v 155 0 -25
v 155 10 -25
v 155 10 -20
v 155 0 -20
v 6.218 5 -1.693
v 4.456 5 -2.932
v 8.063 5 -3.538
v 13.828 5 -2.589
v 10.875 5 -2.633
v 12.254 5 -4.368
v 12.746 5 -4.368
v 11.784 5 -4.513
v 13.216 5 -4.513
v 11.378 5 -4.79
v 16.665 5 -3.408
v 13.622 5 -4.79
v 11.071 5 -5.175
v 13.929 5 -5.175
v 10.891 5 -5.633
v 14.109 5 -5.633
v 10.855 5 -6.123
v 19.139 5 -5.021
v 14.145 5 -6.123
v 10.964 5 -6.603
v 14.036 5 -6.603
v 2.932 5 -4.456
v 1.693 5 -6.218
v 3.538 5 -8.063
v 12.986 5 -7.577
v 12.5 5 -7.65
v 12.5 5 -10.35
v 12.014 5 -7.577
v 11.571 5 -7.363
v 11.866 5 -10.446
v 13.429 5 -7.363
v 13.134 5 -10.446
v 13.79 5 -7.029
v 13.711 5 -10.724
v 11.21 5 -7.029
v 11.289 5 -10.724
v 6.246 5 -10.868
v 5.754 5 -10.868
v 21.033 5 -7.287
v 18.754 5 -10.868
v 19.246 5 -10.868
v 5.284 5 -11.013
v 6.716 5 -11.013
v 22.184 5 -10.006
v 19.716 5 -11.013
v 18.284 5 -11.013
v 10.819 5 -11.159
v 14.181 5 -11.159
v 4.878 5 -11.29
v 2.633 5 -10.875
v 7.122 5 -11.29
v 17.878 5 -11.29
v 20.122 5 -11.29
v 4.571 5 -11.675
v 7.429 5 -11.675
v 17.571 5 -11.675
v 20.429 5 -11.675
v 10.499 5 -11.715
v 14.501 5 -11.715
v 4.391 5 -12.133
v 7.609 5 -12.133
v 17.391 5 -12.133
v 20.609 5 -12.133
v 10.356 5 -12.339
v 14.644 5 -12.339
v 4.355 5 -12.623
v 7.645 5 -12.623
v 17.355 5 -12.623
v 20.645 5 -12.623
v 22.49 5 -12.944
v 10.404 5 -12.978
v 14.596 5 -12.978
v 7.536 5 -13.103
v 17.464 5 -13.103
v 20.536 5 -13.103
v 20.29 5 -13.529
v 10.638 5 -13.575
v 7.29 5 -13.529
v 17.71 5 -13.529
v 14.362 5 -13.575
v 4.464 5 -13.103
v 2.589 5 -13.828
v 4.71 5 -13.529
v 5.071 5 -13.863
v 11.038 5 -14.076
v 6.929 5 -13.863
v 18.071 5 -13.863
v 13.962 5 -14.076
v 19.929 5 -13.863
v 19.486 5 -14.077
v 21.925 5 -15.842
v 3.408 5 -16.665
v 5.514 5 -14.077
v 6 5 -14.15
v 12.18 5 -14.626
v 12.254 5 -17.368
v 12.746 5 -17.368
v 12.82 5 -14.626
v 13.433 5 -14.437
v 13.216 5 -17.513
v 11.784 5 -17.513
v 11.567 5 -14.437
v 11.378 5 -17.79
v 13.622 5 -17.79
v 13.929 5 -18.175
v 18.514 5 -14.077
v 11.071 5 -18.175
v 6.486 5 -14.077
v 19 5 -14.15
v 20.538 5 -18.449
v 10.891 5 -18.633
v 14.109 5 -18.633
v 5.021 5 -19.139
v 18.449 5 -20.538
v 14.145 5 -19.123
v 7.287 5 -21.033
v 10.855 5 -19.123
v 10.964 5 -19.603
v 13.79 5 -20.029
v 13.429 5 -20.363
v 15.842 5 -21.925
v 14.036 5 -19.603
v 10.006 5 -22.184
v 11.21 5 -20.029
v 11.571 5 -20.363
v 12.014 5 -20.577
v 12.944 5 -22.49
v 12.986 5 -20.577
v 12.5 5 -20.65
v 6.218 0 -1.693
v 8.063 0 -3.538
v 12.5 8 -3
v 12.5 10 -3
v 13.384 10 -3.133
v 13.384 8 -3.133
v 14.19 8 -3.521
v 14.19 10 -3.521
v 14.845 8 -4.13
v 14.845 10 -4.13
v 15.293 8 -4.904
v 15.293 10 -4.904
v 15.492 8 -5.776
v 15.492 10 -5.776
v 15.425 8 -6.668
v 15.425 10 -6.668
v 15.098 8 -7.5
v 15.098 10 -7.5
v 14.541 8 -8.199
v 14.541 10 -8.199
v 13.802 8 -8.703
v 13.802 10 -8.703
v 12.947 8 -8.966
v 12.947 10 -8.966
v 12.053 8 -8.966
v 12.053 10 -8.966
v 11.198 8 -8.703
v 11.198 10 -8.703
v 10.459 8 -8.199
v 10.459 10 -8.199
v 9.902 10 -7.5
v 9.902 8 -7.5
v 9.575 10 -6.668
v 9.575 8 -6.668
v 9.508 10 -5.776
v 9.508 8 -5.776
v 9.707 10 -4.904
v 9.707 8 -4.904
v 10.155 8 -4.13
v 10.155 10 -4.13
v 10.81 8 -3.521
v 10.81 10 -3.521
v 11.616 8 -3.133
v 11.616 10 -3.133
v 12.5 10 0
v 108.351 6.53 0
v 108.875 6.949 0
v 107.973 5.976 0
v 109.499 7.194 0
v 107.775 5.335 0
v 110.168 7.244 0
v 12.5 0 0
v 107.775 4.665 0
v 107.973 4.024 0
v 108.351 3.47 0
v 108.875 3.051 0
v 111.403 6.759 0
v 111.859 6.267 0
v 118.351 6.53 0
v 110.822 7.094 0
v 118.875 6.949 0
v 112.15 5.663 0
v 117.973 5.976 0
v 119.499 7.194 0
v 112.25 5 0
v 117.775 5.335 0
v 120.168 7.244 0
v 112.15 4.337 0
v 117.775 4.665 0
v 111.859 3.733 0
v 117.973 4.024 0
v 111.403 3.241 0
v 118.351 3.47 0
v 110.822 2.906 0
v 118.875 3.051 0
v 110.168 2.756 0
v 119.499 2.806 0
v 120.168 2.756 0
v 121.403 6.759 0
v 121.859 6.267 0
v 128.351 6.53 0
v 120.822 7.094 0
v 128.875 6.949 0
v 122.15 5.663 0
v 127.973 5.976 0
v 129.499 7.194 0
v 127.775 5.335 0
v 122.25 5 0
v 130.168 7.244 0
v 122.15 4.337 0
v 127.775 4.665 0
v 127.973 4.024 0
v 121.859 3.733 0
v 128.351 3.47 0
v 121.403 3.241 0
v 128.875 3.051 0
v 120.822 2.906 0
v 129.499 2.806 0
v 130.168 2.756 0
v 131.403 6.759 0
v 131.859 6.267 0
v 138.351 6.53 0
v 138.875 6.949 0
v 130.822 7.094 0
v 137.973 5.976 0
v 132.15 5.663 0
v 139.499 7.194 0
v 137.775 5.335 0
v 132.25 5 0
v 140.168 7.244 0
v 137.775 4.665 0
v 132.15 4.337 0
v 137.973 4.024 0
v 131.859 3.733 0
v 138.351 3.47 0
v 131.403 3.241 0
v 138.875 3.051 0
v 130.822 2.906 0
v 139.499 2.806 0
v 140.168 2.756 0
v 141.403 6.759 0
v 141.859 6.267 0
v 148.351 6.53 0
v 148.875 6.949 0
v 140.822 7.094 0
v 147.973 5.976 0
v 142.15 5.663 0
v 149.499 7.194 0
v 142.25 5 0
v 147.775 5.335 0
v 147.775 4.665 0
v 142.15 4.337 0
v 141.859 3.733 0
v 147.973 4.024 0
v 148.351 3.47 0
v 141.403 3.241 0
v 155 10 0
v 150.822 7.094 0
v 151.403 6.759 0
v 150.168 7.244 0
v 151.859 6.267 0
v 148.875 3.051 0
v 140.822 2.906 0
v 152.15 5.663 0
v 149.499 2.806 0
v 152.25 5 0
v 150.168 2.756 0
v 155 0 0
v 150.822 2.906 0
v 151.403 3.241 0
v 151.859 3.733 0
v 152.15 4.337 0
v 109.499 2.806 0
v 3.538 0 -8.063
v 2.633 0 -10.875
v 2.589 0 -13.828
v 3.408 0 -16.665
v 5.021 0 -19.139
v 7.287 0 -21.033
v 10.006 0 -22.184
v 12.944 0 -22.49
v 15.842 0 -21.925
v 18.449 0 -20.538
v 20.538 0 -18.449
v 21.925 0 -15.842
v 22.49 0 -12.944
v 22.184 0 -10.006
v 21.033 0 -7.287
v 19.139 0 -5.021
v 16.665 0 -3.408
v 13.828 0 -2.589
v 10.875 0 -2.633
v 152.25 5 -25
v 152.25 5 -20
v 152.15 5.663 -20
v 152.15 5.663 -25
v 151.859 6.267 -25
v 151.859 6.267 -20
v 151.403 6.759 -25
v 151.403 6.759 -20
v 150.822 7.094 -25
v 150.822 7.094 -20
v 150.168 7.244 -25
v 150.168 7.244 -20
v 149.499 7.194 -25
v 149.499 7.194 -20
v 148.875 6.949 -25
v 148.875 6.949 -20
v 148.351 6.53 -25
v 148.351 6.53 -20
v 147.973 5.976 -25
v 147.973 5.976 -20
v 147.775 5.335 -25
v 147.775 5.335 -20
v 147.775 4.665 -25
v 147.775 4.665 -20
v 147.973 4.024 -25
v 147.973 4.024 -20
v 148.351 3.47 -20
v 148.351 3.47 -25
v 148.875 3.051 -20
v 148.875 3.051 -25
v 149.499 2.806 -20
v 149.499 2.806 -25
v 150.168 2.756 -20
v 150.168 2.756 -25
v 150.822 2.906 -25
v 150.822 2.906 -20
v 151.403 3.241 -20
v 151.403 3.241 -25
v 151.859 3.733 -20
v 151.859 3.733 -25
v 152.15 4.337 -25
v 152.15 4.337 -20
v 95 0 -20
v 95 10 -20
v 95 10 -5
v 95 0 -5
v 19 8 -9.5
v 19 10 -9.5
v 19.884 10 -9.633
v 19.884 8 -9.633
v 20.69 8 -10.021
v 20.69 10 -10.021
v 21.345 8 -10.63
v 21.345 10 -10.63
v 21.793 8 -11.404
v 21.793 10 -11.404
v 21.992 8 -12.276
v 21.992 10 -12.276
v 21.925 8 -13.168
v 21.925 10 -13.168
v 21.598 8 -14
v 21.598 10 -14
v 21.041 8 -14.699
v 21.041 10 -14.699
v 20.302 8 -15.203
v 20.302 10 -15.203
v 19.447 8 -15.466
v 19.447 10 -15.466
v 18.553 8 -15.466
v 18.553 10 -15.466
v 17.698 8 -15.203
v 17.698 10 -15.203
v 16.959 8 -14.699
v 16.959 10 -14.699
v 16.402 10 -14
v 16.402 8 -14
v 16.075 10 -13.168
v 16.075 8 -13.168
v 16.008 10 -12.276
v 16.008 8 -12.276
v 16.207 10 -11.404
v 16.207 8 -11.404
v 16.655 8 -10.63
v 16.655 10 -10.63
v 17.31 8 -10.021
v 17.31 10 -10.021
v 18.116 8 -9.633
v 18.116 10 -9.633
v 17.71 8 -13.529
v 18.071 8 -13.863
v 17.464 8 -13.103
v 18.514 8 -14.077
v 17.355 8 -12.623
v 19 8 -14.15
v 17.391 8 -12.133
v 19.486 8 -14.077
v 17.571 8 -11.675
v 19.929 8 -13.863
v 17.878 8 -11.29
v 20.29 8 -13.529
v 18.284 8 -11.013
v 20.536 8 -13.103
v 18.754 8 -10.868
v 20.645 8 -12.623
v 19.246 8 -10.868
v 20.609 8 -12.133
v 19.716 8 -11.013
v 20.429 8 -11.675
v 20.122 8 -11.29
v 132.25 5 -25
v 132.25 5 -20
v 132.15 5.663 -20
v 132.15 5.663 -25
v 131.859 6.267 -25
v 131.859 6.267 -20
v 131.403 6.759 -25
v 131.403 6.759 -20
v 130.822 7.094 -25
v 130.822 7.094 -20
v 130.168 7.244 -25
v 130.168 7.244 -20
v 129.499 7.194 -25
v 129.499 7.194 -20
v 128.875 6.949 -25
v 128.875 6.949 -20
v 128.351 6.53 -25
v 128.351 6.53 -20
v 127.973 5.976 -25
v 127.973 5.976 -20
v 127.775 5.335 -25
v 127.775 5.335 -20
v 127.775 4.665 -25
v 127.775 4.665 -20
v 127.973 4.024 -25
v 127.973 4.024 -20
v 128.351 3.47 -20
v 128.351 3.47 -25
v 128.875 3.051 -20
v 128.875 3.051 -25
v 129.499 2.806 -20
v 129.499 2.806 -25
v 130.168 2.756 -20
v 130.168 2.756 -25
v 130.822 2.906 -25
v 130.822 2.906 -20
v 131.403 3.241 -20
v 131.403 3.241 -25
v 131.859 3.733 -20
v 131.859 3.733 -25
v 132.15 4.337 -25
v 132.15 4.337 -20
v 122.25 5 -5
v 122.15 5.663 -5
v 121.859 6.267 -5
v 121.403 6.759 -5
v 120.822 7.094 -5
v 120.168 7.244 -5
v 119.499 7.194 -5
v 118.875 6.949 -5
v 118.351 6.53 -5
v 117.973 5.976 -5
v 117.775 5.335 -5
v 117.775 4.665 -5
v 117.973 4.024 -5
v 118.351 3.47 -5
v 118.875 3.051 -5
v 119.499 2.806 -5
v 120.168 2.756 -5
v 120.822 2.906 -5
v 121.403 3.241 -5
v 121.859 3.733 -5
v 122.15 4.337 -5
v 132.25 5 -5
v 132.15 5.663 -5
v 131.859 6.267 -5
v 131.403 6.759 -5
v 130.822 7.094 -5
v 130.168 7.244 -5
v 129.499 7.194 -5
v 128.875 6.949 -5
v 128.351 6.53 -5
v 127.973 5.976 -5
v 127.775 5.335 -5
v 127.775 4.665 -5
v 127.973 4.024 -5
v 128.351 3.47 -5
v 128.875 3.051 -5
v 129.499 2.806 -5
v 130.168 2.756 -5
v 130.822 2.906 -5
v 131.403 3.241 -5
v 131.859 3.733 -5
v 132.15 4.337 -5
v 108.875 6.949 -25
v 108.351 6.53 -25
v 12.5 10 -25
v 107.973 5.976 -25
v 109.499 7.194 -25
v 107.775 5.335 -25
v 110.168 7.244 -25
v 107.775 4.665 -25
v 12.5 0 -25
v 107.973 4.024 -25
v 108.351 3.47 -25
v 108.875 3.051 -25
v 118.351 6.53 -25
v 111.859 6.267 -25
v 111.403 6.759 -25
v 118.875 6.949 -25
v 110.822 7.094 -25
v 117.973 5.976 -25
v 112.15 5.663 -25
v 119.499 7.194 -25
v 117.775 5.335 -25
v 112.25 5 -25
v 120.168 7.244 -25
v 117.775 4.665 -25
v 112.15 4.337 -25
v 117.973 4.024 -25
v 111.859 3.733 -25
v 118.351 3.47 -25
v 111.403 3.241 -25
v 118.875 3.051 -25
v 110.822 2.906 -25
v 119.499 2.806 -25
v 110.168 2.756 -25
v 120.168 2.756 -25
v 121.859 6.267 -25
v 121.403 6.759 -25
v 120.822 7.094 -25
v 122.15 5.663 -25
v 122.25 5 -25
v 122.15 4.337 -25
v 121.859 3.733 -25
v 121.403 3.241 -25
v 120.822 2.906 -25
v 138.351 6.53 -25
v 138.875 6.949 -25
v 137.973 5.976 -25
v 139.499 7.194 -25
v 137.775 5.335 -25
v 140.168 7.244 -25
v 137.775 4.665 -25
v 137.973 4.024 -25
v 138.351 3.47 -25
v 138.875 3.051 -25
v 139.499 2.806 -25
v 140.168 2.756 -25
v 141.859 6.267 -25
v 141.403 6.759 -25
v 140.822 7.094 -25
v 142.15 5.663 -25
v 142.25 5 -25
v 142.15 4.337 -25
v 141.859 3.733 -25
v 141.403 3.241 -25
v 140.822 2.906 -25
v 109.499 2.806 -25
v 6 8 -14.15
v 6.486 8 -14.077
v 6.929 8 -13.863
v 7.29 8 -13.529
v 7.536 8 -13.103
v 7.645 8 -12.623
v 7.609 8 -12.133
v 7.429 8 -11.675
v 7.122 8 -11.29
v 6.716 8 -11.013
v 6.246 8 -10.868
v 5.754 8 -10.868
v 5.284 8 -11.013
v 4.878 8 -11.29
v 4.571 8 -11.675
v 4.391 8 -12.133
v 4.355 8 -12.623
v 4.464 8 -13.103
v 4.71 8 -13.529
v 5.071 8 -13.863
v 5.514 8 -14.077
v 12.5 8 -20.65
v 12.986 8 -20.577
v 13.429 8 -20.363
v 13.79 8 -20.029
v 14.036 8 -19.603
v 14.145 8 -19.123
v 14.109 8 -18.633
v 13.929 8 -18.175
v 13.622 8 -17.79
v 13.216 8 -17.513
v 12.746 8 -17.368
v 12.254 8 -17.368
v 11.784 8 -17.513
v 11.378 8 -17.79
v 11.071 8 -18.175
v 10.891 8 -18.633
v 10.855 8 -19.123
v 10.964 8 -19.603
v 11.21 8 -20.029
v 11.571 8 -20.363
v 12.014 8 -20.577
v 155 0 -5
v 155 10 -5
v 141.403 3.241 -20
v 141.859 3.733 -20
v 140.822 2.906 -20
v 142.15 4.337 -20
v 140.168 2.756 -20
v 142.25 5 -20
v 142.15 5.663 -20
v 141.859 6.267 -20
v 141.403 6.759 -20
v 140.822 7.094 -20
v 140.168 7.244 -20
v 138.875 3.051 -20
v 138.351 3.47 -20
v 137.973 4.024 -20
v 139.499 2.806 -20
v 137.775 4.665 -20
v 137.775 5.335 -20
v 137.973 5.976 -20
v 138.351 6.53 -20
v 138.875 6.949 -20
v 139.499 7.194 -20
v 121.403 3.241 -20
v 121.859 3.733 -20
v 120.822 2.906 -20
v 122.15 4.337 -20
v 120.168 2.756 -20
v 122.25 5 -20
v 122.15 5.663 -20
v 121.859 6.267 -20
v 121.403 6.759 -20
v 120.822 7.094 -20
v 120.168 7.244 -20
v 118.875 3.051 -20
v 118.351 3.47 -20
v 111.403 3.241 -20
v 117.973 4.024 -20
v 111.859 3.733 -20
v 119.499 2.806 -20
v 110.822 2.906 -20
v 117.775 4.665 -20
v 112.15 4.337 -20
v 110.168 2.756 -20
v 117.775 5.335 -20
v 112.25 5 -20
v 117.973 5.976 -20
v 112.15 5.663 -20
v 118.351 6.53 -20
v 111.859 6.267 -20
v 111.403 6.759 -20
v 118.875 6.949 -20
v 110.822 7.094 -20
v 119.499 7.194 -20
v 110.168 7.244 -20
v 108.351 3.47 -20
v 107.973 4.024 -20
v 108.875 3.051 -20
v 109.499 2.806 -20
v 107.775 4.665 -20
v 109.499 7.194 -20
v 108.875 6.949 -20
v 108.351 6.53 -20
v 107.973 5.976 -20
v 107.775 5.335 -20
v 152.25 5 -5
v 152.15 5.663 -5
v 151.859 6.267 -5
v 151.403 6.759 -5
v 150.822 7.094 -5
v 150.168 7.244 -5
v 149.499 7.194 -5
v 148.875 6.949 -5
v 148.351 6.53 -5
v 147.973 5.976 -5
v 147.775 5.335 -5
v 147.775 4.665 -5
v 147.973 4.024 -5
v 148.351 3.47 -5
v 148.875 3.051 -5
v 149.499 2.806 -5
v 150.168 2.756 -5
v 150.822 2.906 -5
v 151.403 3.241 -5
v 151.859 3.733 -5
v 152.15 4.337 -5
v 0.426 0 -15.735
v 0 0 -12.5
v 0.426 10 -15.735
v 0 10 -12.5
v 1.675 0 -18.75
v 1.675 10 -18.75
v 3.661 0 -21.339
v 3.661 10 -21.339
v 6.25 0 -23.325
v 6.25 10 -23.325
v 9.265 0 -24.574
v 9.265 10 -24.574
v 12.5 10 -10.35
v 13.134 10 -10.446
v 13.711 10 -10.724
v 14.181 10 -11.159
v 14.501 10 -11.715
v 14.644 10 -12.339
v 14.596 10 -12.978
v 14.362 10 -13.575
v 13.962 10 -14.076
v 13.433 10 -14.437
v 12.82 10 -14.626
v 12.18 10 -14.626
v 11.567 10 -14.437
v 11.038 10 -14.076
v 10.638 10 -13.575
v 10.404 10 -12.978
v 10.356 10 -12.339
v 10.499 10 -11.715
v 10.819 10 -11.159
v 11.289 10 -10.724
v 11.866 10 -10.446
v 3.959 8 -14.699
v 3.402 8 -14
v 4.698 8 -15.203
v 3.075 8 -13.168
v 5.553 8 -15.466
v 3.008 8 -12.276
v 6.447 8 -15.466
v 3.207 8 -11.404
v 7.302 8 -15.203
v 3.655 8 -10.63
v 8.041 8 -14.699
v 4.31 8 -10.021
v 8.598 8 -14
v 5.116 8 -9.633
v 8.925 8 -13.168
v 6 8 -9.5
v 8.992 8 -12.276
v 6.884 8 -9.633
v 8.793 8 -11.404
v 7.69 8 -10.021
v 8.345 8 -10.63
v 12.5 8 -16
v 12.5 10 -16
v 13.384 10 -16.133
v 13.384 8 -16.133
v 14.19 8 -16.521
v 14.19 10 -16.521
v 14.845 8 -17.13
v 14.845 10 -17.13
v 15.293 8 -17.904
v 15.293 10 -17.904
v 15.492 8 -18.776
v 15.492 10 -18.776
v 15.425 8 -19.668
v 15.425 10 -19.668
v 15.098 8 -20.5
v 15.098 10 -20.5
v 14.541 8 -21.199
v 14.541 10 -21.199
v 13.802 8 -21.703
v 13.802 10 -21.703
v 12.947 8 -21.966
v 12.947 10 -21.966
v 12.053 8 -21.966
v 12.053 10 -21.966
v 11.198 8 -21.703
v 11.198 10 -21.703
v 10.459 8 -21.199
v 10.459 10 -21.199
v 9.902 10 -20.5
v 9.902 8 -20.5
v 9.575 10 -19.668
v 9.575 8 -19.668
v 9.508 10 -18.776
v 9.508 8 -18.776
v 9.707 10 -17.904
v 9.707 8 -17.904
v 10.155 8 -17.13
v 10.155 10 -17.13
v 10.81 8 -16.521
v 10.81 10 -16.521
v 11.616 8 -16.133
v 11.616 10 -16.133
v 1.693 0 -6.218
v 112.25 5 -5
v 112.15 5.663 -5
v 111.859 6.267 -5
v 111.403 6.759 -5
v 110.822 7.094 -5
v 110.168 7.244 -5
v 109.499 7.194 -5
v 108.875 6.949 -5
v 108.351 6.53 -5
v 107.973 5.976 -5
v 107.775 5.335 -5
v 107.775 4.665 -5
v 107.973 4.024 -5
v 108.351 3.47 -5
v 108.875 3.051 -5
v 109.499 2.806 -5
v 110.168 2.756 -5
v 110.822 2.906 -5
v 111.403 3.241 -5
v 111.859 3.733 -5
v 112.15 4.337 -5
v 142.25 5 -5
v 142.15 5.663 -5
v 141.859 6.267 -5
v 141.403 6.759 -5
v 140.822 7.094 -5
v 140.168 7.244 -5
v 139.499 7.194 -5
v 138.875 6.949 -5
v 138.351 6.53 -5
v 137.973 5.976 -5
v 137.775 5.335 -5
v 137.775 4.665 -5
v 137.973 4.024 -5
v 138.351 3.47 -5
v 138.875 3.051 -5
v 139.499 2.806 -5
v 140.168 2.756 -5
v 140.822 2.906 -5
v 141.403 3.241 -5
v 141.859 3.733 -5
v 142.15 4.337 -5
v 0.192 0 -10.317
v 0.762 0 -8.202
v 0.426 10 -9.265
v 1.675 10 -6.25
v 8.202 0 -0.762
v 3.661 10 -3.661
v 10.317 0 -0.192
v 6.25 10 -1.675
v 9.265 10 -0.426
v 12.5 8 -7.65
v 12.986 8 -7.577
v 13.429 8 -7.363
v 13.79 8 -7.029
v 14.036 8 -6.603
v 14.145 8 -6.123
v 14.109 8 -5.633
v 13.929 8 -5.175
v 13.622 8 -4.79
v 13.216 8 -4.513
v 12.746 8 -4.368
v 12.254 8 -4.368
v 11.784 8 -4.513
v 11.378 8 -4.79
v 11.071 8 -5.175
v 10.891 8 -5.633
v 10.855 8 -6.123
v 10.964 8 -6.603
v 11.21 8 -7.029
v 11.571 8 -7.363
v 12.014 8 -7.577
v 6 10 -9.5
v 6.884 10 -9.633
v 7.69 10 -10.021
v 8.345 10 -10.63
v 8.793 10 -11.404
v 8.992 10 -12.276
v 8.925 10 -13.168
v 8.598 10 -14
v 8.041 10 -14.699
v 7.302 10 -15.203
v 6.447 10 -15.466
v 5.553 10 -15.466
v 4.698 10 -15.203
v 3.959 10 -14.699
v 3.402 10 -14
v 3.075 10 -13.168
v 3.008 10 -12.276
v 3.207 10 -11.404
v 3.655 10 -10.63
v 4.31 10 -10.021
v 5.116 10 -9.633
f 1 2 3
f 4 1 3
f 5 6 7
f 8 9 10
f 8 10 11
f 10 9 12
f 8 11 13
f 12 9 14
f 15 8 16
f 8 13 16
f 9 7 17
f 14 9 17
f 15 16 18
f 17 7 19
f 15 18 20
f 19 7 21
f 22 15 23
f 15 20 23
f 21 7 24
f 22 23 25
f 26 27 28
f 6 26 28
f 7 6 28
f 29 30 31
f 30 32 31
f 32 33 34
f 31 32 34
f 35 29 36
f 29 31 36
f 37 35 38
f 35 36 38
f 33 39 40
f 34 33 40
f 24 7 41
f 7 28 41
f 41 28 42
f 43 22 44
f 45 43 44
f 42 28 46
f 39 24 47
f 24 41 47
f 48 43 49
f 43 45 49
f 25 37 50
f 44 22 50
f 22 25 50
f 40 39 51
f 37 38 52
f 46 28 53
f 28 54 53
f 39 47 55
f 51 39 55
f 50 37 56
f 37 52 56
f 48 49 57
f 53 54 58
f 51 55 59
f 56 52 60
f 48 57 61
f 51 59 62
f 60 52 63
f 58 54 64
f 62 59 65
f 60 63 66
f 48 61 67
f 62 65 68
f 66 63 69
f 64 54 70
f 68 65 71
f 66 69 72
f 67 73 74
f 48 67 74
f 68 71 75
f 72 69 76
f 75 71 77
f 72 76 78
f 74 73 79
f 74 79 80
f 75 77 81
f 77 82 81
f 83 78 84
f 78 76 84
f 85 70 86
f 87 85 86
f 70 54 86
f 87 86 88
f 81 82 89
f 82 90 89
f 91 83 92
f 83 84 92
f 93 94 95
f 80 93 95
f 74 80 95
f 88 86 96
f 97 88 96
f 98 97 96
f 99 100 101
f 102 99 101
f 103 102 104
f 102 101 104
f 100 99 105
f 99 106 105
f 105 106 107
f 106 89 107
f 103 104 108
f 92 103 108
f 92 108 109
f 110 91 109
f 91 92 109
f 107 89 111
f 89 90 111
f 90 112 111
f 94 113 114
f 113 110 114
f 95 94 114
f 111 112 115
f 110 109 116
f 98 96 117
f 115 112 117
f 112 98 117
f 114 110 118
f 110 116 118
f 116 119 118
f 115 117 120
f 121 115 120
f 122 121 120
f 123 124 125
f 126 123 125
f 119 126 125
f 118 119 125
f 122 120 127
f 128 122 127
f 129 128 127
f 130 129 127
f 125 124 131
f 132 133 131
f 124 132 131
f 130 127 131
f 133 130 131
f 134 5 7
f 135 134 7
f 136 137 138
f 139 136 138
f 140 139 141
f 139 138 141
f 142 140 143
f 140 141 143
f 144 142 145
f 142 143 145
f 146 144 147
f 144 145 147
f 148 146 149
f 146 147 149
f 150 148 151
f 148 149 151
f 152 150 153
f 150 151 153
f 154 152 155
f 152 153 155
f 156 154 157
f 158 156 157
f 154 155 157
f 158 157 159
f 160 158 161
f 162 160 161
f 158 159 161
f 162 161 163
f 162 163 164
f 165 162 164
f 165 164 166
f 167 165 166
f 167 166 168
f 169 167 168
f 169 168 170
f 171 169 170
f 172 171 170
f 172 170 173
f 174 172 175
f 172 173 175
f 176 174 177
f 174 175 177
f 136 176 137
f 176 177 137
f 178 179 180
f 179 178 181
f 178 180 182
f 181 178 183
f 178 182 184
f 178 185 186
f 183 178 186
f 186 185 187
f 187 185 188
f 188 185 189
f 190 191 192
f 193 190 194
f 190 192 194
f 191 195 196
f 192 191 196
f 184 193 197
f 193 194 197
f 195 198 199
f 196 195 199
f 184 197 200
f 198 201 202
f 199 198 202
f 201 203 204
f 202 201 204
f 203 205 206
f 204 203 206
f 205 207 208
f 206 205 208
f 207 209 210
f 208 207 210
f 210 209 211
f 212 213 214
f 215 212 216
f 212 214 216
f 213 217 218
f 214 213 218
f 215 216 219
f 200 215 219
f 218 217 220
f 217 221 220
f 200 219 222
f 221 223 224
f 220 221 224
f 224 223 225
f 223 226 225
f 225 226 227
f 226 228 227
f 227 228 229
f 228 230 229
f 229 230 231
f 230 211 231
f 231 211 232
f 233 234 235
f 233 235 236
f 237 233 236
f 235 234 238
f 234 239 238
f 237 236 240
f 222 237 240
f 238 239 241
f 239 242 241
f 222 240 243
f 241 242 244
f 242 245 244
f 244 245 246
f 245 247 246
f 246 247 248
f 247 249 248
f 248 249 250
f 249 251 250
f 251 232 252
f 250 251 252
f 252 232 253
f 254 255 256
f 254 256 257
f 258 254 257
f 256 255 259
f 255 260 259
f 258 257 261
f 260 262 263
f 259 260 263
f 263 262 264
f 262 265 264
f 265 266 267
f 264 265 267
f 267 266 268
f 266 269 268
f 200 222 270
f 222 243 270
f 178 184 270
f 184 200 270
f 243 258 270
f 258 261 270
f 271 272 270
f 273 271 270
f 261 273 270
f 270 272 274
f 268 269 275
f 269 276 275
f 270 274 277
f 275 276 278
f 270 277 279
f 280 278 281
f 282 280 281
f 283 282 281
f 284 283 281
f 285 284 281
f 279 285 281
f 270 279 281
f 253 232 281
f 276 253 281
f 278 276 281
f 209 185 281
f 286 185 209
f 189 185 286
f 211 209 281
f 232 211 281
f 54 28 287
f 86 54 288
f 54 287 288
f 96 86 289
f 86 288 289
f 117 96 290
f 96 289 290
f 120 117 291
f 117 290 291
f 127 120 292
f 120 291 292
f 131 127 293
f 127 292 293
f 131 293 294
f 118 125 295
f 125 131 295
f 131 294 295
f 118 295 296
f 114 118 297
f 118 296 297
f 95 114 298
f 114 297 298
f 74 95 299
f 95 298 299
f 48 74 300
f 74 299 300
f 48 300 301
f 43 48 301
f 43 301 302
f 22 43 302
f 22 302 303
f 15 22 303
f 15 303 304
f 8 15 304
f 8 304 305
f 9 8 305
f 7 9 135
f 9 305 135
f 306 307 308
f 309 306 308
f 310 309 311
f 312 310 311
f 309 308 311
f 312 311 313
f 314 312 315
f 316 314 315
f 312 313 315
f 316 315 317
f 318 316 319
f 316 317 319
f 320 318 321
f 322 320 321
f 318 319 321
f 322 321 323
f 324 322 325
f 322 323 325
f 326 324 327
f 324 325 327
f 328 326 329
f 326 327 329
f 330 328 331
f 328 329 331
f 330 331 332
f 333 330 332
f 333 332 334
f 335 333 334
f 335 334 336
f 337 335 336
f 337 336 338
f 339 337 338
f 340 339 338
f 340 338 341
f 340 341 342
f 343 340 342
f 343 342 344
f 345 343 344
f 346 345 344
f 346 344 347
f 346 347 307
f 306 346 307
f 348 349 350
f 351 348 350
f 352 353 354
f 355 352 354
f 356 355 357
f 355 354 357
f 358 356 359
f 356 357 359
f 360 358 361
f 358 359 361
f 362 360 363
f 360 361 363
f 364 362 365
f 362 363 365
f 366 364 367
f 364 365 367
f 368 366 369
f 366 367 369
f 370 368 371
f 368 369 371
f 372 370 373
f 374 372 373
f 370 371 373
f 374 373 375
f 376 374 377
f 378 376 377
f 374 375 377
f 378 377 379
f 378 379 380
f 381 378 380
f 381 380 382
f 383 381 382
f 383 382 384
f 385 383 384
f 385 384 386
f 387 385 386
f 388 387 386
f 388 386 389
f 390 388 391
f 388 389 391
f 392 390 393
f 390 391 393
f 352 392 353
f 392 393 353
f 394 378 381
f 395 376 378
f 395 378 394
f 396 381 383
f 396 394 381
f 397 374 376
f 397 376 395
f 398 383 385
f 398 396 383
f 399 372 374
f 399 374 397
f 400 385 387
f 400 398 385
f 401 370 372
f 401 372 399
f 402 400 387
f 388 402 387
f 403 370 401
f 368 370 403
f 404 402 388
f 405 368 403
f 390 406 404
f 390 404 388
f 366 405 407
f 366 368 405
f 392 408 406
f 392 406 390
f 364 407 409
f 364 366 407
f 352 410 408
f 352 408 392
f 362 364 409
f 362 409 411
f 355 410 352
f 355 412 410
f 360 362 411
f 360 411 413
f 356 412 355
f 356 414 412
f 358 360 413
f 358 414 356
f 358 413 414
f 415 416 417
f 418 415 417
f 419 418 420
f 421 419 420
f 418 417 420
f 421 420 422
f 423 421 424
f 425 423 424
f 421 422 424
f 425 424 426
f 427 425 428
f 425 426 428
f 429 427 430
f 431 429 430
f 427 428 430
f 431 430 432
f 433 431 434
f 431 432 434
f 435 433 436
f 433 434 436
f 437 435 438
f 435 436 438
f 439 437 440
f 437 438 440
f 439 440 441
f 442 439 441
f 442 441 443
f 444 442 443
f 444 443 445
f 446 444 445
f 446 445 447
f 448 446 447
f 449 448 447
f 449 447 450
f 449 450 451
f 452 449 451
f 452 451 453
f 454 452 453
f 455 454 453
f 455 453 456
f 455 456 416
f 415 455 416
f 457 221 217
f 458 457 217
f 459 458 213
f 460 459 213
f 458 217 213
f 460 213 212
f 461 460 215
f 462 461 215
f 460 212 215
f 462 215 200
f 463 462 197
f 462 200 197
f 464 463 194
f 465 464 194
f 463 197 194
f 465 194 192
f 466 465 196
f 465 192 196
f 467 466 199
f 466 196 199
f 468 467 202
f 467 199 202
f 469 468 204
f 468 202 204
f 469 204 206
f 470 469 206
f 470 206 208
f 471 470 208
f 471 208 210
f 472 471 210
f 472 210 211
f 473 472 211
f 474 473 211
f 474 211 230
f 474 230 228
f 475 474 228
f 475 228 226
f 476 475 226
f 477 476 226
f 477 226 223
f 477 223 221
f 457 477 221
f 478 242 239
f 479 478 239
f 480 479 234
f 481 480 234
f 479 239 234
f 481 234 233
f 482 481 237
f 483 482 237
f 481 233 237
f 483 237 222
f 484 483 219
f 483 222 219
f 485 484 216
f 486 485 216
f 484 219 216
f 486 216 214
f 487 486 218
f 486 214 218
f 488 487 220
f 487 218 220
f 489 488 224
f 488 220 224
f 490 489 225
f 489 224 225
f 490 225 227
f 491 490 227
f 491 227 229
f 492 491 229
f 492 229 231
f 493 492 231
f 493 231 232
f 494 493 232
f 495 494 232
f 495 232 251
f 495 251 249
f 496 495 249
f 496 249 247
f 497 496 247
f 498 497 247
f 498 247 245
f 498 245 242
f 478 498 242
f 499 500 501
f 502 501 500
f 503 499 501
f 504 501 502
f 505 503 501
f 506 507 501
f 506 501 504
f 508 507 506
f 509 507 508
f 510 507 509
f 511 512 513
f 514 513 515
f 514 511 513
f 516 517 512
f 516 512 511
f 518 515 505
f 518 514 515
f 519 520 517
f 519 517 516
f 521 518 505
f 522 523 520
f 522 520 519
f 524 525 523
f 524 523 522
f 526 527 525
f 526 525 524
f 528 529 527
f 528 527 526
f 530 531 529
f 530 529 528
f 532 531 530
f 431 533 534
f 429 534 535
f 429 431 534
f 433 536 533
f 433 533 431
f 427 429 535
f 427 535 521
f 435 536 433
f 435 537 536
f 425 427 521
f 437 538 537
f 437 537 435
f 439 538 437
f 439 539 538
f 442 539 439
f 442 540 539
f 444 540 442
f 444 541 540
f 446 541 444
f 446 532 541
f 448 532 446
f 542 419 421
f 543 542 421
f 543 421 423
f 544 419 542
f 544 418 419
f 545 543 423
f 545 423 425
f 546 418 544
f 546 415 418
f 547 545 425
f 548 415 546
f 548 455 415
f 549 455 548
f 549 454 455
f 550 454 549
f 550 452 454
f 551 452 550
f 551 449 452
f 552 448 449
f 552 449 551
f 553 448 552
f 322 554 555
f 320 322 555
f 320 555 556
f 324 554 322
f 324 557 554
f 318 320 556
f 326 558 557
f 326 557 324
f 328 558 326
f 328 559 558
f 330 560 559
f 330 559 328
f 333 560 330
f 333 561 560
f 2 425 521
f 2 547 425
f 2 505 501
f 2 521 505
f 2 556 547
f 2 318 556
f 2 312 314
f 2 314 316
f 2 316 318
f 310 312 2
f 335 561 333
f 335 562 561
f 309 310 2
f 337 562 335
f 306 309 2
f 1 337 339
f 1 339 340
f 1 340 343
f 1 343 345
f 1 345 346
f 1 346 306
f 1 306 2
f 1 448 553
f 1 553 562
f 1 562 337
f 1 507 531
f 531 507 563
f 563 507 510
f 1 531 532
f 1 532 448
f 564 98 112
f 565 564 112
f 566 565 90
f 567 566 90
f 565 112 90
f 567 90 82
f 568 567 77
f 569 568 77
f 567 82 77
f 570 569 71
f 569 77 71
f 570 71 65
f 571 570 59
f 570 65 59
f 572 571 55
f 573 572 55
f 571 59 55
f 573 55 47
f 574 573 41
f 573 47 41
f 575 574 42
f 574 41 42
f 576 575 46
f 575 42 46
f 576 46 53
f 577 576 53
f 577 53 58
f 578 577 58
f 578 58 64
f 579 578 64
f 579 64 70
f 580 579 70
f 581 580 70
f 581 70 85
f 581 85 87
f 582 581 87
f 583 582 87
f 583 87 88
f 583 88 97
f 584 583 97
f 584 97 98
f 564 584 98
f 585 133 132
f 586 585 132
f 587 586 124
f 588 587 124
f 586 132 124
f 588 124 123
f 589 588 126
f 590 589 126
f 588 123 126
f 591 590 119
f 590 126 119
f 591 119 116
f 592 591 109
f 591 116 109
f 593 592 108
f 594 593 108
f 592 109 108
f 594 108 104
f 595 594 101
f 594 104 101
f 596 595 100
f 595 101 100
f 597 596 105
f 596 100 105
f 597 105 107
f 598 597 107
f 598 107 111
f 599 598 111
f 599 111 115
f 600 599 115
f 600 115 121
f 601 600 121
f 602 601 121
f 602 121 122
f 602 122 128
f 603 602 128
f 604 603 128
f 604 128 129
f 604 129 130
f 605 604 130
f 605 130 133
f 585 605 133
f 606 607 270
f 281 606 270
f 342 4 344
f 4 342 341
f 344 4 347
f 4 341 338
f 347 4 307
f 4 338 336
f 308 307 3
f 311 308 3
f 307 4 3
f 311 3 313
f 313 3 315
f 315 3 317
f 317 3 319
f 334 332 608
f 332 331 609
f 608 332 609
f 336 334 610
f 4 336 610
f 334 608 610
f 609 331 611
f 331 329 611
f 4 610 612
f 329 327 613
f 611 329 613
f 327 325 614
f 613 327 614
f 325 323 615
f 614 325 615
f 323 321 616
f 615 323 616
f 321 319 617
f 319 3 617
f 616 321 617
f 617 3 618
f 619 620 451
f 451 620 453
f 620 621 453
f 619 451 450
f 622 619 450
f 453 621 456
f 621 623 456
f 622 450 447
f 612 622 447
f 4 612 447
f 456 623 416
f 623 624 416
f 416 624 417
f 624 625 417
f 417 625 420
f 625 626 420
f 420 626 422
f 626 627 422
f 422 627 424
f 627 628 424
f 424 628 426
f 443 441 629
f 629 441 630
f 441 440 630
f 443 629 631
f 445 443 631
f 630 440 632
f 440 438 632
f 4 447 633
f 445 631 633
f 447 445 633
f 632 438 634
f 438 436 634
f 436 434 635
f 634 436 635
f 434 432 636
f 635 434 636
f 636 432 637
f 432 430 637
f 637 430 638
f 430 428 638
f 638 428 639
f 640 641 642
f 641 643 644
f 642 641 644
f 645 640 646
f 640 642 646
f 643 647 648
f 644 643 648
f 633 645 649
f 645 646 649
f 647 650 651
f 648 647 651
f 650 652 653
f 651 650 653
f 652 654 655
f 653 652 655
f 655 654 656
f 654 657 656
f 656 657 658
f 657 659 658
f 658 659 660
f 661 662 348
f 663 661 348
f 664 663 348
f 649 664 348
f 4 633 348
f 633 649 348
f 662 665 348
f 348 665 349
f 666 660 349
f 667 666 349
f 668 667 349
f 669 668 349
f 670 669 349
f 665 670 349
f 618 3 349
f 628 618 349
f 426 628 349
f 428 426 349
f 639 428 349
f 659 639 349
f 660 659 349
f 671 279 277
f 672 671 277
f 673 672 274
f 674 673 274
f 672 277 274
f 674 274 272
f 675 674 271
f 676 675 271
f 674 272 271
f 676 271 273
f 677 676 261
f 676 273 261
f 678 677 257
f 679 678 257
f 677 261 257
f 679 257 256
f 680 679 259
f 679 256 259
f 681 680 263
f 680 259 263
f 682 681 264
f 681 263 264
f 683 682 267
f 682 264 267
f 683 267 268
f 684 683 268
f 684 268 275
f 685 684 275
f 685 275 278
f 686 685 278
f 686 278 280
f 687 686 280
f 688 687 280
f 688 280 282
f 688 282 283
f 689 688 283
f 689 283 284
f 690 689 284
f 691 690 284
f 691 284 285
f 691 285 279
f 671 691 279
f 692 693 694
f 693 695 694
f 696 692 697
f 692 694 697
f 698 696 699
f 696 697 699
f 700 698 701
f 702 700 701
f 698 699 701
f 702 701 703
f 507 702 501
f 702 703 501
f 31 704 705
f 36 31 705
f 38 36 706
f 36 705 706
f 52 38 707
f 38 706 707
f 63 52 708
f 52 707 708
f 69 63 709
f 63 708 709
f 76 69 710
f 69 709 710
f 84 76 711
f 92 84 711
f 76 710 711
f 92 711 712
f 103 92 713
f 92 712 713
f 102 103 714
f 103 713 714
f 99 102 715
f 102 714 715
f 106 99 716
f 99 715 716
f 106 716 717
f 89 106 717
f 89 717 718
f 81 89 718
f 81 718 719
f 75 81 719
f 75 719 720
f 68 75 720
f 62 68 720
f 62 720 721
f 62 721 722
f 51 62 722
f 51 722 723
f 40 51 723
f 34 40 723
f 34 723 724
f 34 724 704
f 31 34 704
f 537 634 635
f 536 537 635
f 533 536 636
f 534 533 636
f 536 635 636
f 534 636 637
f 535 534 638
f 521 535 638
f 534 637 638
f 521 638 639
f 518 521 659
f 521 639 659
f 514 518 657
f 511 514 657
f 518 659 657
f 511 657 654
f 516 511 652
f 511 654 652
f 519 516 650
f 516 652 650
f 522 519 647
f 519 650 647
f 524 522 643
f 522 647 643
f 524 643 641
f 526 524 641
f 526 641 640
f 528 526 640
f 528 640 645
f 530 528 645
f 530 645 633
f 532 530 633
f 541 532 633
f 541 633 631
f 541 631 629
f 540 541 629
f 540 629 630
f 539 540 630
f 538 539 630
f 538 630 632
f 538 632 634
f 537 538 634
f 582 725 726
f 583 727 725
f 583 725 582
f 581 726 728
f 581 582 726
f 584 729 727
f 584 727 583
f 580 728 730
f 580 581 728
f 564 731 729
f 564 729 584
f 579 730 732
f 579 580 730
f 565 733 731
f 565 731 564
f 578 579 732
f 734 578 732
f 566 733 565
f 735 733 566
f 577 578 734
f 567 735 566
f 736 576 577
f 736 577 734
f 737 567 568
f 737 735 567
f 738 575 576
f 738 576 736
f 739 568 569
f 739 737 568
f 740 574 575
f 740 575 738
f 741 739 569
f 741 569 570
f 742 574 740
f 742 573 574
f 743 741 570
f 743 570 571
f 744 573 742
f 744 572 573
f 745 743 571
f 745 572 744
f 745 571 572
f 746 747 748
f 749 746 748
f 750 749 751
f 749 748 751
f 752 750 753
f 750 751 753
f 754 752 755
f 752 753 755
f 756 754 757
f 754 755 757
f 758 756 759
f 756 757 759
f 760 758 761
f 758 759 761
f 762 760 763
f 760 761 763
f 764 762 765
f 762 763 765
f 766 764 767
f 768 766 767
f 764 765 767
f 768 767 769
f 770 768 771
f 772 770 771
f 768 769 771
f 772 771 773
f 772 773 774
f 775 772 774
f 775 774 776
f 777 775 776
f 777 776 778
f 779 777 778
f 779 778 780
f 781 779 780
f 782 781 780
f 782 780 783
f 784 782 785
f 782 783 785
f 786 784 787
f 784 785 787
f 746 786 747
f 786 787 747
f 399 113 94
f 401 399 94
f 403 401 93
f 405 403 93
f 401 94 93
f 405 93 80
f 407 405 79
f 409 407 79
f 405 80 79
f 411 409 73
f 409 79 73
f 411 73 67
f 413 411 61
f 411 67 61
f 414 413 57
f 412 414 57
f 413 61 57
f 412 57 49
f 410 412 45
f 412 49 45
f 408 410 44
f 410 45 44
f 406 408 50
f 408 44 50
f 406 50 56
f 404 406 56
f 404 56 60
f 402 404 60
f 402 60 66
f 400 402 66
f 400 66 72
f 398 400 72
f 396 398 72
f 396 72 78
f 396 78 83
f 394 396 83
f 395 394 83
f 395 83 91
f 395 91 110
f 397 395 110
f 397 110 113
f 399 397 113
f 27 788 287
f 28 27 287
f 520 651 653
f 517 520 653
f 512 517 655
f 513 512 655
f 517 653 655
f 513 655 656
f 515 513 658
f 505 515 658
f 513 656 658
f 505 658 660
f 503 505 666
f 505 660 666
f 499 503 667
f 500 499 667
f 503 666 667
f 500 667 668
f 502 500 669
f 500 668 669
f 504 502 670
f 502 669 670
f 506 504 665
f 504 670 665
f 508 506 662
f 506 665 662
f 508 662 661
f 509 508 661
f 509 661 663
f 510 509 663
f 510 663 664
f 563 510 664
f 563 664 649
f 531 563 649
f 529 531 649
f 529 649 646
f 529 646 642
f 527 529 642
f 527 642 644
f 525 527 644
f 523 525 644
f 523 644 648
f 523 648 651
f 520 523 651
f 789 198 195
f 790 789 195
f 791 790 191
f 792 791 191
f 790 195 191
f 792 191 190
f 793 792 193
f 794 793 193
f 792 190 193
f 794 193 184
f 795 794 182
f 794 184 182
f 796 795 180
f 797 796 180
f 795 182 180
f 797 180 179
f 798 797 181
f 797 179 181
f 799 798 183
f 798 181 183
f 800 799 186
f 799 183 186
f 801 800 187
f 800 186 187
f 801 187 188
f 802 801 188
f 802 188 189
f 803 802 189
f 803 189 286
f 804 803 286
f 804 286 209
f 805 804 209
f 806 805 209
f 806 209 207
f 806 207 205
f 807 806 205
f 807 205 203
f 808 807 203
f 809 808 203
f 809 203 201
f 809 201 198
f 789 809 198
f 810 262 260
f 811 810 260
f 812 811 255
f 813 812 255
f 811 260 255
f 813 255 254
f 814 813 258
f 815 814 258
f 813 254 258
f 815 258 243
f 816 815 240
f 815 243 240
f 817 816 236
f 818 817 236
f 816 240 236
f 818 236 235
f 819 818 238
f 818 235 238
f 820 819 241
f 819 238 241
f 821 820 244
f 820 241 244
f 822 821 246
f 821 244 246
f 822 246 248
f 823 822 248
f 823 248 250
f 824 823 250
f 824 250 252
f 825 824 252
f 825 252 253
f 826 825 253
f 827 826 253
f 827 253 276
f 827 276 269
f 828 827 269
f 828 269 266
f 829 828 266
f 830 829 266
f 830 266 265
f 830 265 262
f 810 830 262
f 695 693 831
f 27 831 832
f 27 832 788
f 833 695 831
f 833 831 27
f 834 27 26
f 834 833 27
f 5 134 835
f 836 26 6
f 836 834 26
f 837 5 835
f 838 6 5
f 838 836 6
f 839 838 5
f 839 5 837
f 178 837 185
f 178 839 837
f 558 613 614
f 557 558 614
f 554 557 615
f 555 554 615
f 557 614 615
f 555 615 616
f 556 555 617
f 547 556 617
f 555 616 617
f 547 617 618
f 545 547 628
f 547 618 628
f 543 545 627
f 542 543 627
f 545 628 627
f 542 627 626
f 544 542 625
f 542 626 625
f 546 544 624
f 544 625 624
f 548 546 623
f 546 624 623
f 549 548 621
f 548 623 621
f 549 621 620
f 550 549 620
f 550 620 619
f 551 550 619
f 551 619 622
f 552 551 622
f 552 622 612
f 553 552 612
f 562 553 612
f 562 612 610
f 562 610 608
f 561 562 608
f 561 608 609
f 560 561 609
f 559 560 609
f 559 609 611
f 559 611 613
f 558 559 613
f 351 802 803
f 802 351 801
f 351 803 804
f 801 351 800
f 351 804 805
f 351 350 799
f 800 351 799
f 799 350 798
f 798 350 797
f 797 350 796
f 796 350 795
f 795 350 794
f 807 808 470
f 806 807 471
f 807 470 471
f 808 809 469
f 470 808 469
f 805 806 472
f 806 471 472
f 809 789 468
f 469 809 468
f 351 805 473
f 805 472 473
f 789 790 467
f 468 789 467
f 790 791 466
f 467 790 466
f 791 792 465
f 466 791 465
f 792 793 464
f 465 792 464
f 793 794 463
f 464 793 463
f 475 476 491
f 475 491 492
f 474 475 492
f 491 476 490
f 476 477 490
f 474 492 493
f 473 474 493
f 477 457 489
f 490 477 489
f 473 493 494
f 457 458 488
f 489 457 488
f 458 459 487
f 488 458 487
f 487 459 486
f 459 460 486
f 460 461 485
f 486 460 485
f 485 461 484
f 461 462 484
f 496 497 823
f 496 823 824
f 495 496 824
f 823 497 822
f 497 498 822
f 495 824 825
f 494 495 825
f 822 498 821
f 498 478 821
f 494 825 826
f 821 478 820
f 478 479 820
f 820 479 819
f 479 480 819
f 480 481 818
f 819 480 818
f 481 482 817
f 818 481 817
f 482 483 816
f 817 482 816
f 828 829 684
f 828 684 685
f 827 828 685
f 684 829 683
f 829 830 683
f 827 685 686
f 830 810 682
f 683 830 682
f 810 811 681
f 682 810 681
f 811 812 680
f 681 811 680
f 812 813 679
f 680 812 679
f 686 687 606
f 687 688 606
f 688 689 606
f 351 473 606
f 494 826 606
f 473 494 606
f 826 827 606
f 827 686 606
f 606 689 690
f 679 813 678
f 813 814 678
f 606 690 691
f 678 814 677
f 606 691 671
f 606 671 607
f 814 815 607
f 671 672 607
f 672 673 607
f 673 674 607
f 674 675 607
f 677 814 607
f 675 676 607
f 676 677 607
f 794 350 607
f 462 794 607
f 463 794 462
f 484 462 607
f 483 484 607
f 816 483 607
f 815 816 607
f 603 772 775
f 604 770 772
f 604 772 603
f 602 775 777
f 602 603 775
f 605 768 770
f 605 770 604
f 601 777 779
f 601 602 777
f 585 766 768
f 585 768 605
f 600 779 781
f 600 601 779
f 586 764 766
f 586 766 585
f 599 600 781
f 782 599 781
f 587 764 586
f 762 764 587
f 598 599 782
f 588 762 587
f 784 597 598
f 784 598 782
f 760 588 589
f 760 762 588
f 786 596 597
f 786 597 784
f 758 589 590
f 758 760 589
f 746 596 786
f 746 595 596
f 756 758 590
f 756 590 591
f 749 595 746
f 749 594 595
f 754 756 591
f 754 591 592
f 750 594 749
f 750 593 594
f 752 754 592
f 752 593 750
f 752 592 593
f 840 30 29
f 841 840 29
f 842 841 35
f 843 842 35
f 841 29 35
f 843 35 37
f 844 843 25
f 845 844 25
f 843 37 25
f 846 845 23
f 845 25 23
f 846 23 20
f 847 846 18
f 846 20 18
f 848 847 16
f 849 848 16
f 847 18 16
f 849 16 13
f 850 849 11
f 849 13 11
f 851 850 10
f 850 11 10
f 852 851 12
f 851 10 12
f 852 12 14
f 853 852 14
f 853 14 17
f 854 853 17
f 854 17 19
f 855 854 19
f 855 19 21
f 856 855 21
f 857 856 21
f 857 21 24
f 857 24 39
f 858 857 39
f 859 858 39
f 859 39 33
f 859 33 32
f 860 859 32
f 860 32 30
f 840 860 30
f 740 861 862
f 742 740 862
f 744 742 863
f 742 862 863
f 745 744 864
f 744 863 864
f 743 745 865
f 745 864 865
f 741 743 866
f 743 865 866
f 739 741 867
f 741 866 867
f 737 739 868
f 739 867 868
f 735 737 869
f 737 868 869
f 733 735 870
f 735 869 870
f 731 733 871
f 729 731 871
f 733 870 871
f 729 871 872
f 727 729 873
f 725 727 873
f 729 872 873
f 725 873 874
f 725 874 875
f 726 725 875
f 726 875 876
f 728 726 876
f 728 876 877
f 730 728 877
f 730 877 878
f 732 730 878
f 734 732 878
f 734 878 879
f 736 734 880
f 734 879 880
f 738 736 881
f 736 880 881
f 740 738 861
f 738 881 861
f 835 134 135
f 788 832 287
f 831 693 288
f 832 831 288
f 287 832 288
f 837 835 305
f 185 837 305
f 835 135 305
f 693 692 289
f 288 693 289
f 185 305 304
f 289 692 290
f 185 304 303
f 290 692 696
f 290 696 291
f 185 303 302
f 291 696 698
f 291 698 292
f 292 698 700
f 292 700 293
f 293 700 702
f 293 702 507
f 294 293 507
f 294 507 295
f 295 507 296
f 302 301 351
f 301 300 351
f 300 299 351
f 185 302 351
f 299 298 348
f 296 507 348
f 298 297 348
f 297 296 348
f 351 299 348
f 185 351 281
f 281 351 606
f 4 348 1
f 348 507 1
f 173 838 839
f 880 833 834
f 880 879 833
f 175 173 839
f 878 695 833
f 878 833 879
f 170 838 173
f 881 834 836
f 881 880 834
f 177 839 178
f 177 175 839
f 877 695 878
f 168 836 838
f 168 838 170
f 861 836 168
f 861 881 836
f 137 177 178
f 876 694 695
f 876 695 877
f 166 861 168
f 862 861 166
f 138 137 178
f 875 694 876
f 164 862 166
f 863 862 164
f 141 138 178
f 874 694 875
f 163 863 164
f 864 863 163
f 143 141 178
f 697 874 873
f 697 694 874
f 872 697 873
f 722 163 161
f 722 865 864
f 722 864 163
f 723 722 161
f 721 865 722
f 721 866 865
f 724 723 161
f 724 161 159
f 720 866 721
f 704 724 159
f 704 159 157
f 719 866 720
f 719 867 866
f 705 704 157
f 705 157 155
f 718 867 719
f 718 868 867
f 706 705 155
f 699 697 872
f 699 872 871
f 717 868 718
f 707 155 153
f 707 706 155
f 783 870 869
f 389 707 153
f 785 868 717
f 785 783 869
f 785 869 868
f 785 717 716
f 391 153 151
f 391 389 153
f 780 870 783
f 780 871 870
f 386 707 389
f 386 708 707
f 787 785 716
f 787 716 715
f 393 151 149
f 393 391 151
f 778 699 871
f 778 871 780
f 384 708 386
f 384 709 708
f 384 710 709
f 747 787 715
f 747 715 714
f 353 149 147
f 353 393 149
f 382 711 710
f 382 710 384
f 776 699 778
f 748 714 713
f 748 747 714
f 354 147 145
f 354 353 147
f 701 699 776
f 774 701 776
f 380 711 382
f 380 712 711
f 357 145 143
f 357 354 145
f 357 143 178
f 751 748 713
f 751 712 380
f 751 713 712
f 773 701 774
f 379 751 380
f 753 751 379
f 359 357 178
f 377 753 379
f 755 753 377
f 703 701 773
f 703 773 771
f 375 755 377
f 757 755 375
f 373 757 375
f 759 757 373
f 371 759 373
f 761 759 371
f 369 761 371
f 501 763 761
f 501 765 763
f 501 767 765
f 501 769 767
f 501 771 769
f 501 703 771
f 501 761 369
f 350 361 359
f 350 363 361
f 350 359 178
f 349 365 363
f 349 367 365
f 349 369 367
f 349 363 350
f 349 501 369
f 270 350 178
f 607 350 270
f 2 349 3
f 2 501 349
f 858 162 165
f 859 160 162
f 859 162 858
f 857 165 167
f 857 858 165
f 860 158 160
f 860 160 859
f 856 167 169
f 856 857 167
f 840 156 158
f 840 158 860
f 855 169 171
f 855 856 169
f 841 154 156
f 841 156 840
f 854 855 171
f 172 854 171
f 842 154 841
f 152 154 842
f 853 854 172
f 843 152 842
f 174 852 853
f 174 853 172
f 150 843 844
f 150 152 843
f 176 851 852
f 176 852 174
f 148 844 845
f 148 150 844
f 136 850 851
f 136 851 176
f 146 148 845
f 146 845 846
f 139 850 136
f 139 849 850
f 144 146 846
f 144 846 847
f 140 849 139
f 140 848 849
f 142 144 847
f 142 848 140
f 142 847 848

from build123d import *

# Parameters (mm, degrees)
SKETCH1_W              = 250
SKETCH1_H              = 25
BOSS_EXTRUDE1_DEPTH    = 10
CUT_EXTRUDE1_REACH     = 253.446
SKETCH2_R              = 2.15
FILLET1_R              = 12.5
SKETCH3_R              = 2.25
CUT_EXTRUDE2_DEPTH     = 252.445819214
CUT_EXTRUDE5_REACH     = 253.446
SKETCH5_W              = 7.3
SKETCH5_H              = 4
SKETCH6_R              = 10
CUT_EXTRUDE6_DEPTH     = 5
CUT_EXTRUDE7_REACH     = 253.297
SKETCH7_R              = 1.65
CUT_EXTRUDE8_START     = -3.2
CUT_EXTRUDE8_OUTLINE_W = 6
CUT_EXTRUDE8_OUTLINE_H = 6
CUT_EXTRUDE8_DEPTH     = 6.4
SKETCH9_R              = 3
CUT_EXTRUDE9_DEPTH     = 2
CUT_EXTRUDE10_DEPTH    = 252.445819214
SKETCH11_R             = 2.25
CUT_EXTRUDE11_DEPTH    = 158.321327226


# Read off the part's stored shape, not the designer's step: Cut-Extrude8
with BuildPart() as part:
    # Sketch1 → Boss-Extrude1 (new body)
    with BuildSketch(Plane(origin=(0, 0, 0), x_dir=(1, 0, 0), z_dir=(0, 1, 0))):
        with Locations((125, 12.5)):
            Rectangle(SKETCH1_W, SKETCH1_H)
    extrude(amount=BOSS_EXTRUDE1_DEPTH)

    # Sketch2 → Cut-Extrude1 (cut, up to next)
    with BuildSketch(Plane(origin=(0, 10, 0), x_dir=(1, 0, 0), z_dir=(0, 1, 0)), mode=Mode.PRIVATE) as cut_extrude1_sk1:
        with Locations(Location((12.5, 12.5, 0), (0, 0, 270))):
            Circle(SKETCH2_R)
    cut_extrude1_tool1 = extrude(cut_extrude1_sk1.sketch, amount=-CUT_EXTRUDE1_REACH, mode=Mode.PRIVATE) & part.part
    add(cut_extrude1_tool1.solids().sort_by_distance((12.5, 10, -12.5))[0], mode=Mode.SUBTRACT)

    # Fillet1
    fillet1_edges = [part.edges().sort_by_distance(p)[0] for p in [
        (0, 5, 0),
        (0, 5, -25),
    ]]
    fillet(fillet1_edges, radius=FILLET1_R - 0.0001)  # a hair under: the kernel refuses the full size

    # Sketch3 → Cut-Extrude2 (cut, through all)
    with BuildSketch(Plane(origin=(0, 0, -25), x_dir=(-1, 0, 0), z_dir=(0, 0, -1))):
        with Locations((-244.5, 5)):
            Circle(SKETCH3_R)
        with Locations((-230.5, 5)):
            Circle(SKETCH3_R)
    extrude(amount=-CUT_EXTRUDE2_DEPTH, mode=Mode.SUBTRACT)

    # Sketch5 → Cut-Extrude5 (cut, up to next)
    with BuildSketch(Plane(origin=(0, 10, 0), x_dir=(1, 0, 0), z_dir=(0, 1, 0)), mode=Mode.PRIVATE) as cut_extrude5_sk1:
        with Locations((244.5, 19)):
            Rectangle(SKETCH5_W, SKETCH5_H)
    cut_extrude5_tool1 = extrude(cut_extrude5_sk1.sketch, amount=-CUT_EXTRUDE5_REACH, mode=Mode.PRIVATE) & part.part
    # Sketch5 → Cut-Extrude5 (cut, up to next)
    with BuildSketch(Plane(origin=(0, 10, 0), x_dir=(1, 0, 0), z_dir=(0, 1, 0)), mode=Mode.PRIVATE) as cut_extrude5_sk2:
        with Locations((244.5, 6)):
            Rectangle(SKETCH5_W, SKETCH5_H)
    cut_extrude5_tool2 = extrude(cut_extrude5_sk2.sketch, amount=-CUT_EXTRUDE5_REACH, mode=Mode.PRIVATE) & part.part
    # Sketch5 → Cut-Extrude5 (cut, up to next)
    with BuildSketch(Plane(origin=(0, 10, 0), x_dir=(1, 0, 0), z_dir=(0, 1, 0)), mode=Mode.PRIVATE) as cut_extrude5_sk3:
        with Locations((230.5, 19)):
            Rectangle(SKETCH5_W, SKETCH5_H)
    cut_extrude5_tool3 = extrude(cut_extrude5_sk3.sketch, amount=-CUT_EXTRUDE5_REACH, mode=Mode.PRIVATE) & part.part
    # Sketch5 → Cut-Extrude5 (cut, up to next)
    with BuildSketch(Plane(origin=(0, 10, 0), x_dir=(1, 0, 0), z_dir=(0, 1, 0)), mode=Mode.PRIVATE) as cut_extrude5_sk4:
        with Locations((230.5, 6)):
            Rectangle(SKETCH5_W, SKETCH5_H)
    cut_extrude5_tool4 = extrude(cut_extrude5_sk4.sketch, amount=-CUT_EXTRUDE5_REACH, mode=Mode.PRIVATE) & part.part
    add(cut_extrude5_tool1.solids().sort_by_distance((244.5, 10, -19))[0], mode=Mode.SUBTRACT)
    add(cut_extrude5_tool2.solids().sort_by_distance((244.5, 10, -6))[0], mode=Mode.SUBTRACT)
    add(cut_extrude5_tool3.solids().sort_by_distance((230.5, 10, -19))[0], mode=Mode.SUBTRACT)
    add(cut_extrude5_tool4.solids().sort_by_distance((230.5, 10, -6))[0], mode=Mode.SUBTRACT)

    # Sketch6 → Cut-Extrude6 (cut)
    with BuildSketch(Plane.XZ):
        with Locations(Location((12.5, -12.5, 0), (0, 0, 270))):
            Circle(SKETCH6_R)
    extrude(amount=-CUT_EXTRUDE6_DEPTH, mode=Mode.SUBTRACT)

    # Sketch7 → Cut-Extrude7 (cut, up to next)
    with BuildSketch(Plane.XZ.offset(-5), mode=Mode.PRIVATE) as cut_extrude7_sk1:
        with Locations(Location((12.5, -6, 0), (0, 0, 270))):
            Circle(SKETCH7_R)
    cut_extrude7_tool1 = extrude(cut_extrude7_sk1.sketch, amount=-CUT_EXTRUDE7_REACH, mode=Mode.PRIVATE) & part.part
    # Sketch7 → Cut-Extrude7 (cut, up to next)
    with BuildSketch(Plane.XZ.offset(-5), mode=Mode.PRIVATE) as cut_extrude7_sk2:
        with Locations(Location((19, -12.5, 0), (0, 0, 270))):
            Circle(SKETCH7_R)
    cut_extrude7_tool2 = extrude(cut_extrude7_sk2.sketch, amount=-CUT_EXTRUDE7_REACH, mode=Mode.PRIVATE) & part.part
    # Sketch7 → Cut-Extrude7 (cut, up to next)
    with BuildSketch(Plane.XZ.offset(-5), mode=Mode.PRIVATE) as cut_extrude7_sk3:
        with Locations(Location((12.5, -19, 0), (0, 0, 270))):
            Circle(SKETCH7_R)
    cut_extrude7_tool3 = extrude(cut_extrude7_sk3.sketch, amount=-CUT_EXTRUDE7_REACH, mode=Mode.PRIVATE) & part.part
    # Sketch7 → Cut-Extrude7 (cut, up to next)
    with BuildSketch(Plane.XZ.offset(-5), mode=Mode.PRIVATE) as cut_extrude7_sk4:
        with Locations(Location((6, -12.5, 0), (0, 0, 270))):
            Circle(SKETCH7_R)
    cut_extrude7_tool4 = extrude(cut_extrude7_sk4.sketch, amount=-CUT_EXTRUDE7_REACH, mode=Mode.PRIVATE) & part.part
    add(cut_extrude7_tool1.solids().sort_by_distance((12.5, 5, -6))[0], mode=Mode.SUBTRACT)
    add(cut_extrude7_tool2.solids().sort_by_distance((19, 5, -12.5))[0], mode=Mode.SUBTRACT)
    add(cut_extrude7_tool3.solids().sort_by_distance((12.5, 5, -19))[0], mode=Mode.SUBTRACT)
    add(cut_extrude7_tool4.solids().sort_by_distance((6, 5, -12.5))[0], mode=Mode.SUBTRACT)

    # Cut-Extrude8 outline → Cut-Extrude8 (cut)
    with BuildSketch(Plane(origin=(0, 0, 0), x_dir=(0.707106781186548, 0, -0.707106781186547), z_dir=(0.707106781186547, 0, 0.707106781186548)).offset(CUT_EXTRUDE8_START)):
        with Locations((7, 2)):
            Rectangle(CUT_EXTRUDE8_OUTLINE_W, CUT_EXTRUDE8_OUTLINE_H)
    extrude(amount=CUT_EXTRUDE8_DEPTH, mode=Mode.SUBTRACT)

    # Sketch9 → Cut-Extrude9 (cut)
    with BuildSketch(Plane(origin=(0, 10, 0), x_dir=(1, 0, 0), z_dir=(0, 1, 0))):
        with Locations(Location((12.5, 19, 0), (0, 0, 270))):
            Circle(SKETCH9_R)
        with Locations(Location((19, 12.5, 0), (0, 0, 270))):
            Circle(SKETCH9_R)
        with Locations(Location((12.5, 6, 0), (0, 0, 270))):
            Circle(SKETCH9_R)
        with Locations(Location((6, 12.5, 0), (0, 0, 270))):
            Circle(SKETCH9_R)
    extrude(amount=-CUT_EXTRUDE9_DEPTH, mode=Mode.SUBTRACT)

    # Sketch10 → Cut-Extrude10 (cut, through all)
    with BuildSketch(Plane(origin=(0, 10, 0), x_dir=(1, 0, 0), z_dir=(0, 1, 0))):
        Polygon((95, 5), (155, 5), (155, 0), (250, 0), (250, 25), (155, 25), (155, 20), (95, 20), align=None)
    extrude(amount=-CUT_EXTRUDE10_DEPTH, mode=Mode.SUBTRACT)

    # Sketch11 → Cut-Extrude11 (cut, through all)
    with BuildSketch(Plane.XY):
        with Locations((150, 5)):
            Circle(SKETCH11_R)
        with Locations((140, 5)):
            Circle(SKETCH11_R)
        with Locations((130, 5)):
            Circle(SKETCH11_R)
        with Locations((120, 5)):
            Circle(SKETCH11_R)
        with Locations((110, 5)):
            Circle(SKETCH11_R)
    extrude(amount=-CUT_EXTRUDE11_DEPTH, mode=Mode.SUBTRACT)


solid = part.part
